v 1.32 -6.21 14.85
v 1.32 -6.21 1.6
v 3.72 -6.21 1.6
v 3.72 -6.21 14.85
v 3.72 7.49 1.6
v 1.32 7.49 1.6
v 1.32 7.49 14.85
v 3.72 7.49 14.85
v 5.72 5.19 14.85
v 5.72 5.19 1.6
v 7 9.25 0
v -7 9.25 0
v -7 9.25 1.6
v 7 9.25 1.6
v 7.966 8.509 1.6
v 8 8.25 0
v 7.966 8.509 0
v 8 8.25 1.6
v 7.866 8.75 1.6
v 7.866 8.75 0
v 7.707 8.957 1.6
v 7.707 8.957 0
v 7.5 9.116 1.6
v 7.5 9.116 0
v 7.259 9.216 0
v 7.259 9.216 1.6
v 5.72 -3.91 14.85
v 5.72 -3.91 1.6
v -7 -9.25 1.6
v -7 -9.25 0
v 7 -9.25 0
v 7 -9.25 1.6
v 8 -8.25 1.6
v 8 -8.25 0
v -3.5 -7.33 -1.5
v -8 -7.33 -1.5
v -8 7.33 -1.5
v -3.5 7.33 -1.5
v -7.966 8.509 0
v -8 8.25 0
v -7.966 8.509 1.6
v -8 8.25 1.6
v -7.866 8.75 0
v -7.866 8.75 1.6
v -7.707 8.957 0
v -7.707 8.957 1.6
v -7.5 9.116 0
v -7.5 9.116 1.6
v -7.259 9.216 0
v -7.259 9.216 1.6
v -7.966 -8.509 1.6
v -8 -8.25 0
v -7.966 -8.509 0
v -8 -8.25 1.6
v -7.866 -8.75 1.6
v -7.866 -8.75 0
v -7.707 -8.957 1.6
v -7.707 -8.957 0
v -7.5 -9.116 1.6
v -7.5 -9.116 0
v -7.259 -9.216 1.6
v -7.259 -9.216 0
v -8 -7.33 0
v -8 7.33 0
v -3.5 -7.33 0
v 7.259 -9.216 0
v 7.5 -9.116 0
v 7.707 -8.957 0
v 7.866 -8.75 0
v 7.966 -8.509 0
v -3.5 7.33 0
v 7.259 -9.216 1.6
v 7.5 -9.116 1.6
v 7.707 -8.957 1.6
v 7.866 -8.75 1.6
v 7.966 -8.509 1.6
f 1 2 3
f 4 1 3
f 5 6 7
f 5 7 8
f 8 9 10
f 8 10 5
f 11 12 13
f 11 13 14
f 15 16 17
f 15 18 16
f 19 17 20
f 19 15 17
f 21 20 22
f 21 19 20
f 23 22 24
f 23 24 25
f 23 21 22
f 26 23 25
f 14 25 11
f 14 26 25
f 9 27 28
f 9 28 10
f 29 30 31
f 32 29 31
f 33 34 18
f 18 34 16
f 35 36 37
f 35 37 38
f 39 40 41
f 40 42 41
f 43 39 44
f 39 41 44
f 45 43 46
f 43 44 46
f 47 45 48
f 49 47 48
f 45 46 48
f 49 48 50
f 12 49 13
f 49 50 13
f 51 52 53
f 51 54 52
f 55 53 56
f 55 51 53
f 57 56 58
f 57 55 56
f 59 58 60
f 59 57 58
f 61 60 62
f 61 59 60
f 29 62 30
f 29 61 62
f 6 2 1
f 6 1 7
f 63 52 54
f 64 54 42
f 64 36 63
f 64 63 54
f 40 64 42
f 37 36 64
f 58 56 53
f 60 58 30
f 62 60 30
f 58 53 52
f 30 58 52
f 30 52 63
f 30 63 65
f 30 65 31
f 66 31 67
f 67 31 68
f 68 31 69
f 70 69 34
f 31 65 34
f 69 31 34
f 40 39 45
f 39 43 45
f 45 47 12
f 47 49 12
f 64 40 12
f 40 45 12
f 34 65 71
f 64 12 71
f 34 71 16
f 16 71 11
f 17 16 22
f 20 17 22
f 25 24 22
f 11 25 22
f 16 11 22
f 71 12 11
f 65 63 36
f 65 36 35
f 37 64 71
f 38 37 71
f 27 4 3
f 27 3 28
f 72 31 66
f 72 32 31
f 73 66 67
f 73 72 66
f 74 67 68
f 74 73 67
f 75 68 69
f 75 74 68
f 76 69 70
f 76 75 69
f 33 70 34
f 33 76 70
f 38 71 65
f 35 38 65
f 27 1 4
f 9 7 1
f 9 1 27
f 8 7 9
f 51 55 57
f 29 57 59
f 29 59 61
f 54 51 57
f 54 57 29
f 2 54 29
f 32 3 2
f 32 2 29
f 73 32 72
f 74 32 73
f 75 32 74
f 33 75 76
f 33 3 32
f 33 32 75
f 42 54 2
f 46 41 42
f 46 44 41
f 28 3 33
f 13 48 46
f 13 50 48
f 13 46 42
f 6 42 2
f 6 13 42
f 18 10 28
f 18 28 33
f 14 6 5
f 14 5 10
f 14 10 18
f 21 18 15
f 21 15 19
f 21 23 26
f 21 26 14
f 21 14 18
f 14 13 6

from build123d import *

# Parameters (mm, degrees)
SKETCH_W     = 16
SKETCH_H     = 18.5
PAD_DEPTH    = 1.6
FILLET_R     = 1
SKETCH001_W  = 4.4
SKETCH001_H  = 13.7
PAD001_DEPTH = 13.25
POCKET_DEPTH = 13.25
SKETCH003_W  = 4.5
SKETCH003_H  = 14.66
PAD002_DEPTH = 1.5


with BuildPart() as part:
    # Sketch → Pad (new body)
    with BuildSketch(Plane.XY):
        Rectangle(SKETCH_W, SKETCH_H)
    extrude(amount=PAD_DEPTH)

    # Fillet
    fillet_edges = [part.edges().sort_by_distance(p)[0] for p in [
        (8, -9.25, 0.8),
        (-8, -9.25, 0.8),
        (-8, 9.25, 0.8),
        (8, 9.25, 0.8),
    ]]
    fillet(fillet_edges, radius=FILLET_R)

    # Sketch001 (on Face5 of Fillet) → Pad001 (join)
    with BuildSketch(Plane.XY.offset(1.6)):
        with Locations((3.52, 0.64)):
            Rectangle(SKETCH001_W, SKETCH001_H)
    extrude(amount=PAD001_DEPTH)

    # Sketch002 (on Face15 of Pad001) → Pocket (cut)
    with BuildSketch(Plane.XY.offset(14.85)):
        Polygon((5.72, 7.49), (5.72, 5.19), (3.72, 7.49), align=None)
        Polygon((5.72, -3.91), (5.72, -6.21), (3.72, -6.21), align=None)
    extrude(amount=-POCKET_DEPTH, mode=Mode.SUBTRACT)

    # Sketch003 (on Face2 of Pocket) → Pad002 (join)
    with BuildSketch(Plane(origin=(0, 0, 0), x_dir=(1, 0, 0), z_dir=(0, 0, -1))):
        with Locations((-5.75, 0)):
            Rectangle(SKETCH003_W, SKETCH003_H)
    extrude(amount=PAD002_DEPTH)


solid = part.part
